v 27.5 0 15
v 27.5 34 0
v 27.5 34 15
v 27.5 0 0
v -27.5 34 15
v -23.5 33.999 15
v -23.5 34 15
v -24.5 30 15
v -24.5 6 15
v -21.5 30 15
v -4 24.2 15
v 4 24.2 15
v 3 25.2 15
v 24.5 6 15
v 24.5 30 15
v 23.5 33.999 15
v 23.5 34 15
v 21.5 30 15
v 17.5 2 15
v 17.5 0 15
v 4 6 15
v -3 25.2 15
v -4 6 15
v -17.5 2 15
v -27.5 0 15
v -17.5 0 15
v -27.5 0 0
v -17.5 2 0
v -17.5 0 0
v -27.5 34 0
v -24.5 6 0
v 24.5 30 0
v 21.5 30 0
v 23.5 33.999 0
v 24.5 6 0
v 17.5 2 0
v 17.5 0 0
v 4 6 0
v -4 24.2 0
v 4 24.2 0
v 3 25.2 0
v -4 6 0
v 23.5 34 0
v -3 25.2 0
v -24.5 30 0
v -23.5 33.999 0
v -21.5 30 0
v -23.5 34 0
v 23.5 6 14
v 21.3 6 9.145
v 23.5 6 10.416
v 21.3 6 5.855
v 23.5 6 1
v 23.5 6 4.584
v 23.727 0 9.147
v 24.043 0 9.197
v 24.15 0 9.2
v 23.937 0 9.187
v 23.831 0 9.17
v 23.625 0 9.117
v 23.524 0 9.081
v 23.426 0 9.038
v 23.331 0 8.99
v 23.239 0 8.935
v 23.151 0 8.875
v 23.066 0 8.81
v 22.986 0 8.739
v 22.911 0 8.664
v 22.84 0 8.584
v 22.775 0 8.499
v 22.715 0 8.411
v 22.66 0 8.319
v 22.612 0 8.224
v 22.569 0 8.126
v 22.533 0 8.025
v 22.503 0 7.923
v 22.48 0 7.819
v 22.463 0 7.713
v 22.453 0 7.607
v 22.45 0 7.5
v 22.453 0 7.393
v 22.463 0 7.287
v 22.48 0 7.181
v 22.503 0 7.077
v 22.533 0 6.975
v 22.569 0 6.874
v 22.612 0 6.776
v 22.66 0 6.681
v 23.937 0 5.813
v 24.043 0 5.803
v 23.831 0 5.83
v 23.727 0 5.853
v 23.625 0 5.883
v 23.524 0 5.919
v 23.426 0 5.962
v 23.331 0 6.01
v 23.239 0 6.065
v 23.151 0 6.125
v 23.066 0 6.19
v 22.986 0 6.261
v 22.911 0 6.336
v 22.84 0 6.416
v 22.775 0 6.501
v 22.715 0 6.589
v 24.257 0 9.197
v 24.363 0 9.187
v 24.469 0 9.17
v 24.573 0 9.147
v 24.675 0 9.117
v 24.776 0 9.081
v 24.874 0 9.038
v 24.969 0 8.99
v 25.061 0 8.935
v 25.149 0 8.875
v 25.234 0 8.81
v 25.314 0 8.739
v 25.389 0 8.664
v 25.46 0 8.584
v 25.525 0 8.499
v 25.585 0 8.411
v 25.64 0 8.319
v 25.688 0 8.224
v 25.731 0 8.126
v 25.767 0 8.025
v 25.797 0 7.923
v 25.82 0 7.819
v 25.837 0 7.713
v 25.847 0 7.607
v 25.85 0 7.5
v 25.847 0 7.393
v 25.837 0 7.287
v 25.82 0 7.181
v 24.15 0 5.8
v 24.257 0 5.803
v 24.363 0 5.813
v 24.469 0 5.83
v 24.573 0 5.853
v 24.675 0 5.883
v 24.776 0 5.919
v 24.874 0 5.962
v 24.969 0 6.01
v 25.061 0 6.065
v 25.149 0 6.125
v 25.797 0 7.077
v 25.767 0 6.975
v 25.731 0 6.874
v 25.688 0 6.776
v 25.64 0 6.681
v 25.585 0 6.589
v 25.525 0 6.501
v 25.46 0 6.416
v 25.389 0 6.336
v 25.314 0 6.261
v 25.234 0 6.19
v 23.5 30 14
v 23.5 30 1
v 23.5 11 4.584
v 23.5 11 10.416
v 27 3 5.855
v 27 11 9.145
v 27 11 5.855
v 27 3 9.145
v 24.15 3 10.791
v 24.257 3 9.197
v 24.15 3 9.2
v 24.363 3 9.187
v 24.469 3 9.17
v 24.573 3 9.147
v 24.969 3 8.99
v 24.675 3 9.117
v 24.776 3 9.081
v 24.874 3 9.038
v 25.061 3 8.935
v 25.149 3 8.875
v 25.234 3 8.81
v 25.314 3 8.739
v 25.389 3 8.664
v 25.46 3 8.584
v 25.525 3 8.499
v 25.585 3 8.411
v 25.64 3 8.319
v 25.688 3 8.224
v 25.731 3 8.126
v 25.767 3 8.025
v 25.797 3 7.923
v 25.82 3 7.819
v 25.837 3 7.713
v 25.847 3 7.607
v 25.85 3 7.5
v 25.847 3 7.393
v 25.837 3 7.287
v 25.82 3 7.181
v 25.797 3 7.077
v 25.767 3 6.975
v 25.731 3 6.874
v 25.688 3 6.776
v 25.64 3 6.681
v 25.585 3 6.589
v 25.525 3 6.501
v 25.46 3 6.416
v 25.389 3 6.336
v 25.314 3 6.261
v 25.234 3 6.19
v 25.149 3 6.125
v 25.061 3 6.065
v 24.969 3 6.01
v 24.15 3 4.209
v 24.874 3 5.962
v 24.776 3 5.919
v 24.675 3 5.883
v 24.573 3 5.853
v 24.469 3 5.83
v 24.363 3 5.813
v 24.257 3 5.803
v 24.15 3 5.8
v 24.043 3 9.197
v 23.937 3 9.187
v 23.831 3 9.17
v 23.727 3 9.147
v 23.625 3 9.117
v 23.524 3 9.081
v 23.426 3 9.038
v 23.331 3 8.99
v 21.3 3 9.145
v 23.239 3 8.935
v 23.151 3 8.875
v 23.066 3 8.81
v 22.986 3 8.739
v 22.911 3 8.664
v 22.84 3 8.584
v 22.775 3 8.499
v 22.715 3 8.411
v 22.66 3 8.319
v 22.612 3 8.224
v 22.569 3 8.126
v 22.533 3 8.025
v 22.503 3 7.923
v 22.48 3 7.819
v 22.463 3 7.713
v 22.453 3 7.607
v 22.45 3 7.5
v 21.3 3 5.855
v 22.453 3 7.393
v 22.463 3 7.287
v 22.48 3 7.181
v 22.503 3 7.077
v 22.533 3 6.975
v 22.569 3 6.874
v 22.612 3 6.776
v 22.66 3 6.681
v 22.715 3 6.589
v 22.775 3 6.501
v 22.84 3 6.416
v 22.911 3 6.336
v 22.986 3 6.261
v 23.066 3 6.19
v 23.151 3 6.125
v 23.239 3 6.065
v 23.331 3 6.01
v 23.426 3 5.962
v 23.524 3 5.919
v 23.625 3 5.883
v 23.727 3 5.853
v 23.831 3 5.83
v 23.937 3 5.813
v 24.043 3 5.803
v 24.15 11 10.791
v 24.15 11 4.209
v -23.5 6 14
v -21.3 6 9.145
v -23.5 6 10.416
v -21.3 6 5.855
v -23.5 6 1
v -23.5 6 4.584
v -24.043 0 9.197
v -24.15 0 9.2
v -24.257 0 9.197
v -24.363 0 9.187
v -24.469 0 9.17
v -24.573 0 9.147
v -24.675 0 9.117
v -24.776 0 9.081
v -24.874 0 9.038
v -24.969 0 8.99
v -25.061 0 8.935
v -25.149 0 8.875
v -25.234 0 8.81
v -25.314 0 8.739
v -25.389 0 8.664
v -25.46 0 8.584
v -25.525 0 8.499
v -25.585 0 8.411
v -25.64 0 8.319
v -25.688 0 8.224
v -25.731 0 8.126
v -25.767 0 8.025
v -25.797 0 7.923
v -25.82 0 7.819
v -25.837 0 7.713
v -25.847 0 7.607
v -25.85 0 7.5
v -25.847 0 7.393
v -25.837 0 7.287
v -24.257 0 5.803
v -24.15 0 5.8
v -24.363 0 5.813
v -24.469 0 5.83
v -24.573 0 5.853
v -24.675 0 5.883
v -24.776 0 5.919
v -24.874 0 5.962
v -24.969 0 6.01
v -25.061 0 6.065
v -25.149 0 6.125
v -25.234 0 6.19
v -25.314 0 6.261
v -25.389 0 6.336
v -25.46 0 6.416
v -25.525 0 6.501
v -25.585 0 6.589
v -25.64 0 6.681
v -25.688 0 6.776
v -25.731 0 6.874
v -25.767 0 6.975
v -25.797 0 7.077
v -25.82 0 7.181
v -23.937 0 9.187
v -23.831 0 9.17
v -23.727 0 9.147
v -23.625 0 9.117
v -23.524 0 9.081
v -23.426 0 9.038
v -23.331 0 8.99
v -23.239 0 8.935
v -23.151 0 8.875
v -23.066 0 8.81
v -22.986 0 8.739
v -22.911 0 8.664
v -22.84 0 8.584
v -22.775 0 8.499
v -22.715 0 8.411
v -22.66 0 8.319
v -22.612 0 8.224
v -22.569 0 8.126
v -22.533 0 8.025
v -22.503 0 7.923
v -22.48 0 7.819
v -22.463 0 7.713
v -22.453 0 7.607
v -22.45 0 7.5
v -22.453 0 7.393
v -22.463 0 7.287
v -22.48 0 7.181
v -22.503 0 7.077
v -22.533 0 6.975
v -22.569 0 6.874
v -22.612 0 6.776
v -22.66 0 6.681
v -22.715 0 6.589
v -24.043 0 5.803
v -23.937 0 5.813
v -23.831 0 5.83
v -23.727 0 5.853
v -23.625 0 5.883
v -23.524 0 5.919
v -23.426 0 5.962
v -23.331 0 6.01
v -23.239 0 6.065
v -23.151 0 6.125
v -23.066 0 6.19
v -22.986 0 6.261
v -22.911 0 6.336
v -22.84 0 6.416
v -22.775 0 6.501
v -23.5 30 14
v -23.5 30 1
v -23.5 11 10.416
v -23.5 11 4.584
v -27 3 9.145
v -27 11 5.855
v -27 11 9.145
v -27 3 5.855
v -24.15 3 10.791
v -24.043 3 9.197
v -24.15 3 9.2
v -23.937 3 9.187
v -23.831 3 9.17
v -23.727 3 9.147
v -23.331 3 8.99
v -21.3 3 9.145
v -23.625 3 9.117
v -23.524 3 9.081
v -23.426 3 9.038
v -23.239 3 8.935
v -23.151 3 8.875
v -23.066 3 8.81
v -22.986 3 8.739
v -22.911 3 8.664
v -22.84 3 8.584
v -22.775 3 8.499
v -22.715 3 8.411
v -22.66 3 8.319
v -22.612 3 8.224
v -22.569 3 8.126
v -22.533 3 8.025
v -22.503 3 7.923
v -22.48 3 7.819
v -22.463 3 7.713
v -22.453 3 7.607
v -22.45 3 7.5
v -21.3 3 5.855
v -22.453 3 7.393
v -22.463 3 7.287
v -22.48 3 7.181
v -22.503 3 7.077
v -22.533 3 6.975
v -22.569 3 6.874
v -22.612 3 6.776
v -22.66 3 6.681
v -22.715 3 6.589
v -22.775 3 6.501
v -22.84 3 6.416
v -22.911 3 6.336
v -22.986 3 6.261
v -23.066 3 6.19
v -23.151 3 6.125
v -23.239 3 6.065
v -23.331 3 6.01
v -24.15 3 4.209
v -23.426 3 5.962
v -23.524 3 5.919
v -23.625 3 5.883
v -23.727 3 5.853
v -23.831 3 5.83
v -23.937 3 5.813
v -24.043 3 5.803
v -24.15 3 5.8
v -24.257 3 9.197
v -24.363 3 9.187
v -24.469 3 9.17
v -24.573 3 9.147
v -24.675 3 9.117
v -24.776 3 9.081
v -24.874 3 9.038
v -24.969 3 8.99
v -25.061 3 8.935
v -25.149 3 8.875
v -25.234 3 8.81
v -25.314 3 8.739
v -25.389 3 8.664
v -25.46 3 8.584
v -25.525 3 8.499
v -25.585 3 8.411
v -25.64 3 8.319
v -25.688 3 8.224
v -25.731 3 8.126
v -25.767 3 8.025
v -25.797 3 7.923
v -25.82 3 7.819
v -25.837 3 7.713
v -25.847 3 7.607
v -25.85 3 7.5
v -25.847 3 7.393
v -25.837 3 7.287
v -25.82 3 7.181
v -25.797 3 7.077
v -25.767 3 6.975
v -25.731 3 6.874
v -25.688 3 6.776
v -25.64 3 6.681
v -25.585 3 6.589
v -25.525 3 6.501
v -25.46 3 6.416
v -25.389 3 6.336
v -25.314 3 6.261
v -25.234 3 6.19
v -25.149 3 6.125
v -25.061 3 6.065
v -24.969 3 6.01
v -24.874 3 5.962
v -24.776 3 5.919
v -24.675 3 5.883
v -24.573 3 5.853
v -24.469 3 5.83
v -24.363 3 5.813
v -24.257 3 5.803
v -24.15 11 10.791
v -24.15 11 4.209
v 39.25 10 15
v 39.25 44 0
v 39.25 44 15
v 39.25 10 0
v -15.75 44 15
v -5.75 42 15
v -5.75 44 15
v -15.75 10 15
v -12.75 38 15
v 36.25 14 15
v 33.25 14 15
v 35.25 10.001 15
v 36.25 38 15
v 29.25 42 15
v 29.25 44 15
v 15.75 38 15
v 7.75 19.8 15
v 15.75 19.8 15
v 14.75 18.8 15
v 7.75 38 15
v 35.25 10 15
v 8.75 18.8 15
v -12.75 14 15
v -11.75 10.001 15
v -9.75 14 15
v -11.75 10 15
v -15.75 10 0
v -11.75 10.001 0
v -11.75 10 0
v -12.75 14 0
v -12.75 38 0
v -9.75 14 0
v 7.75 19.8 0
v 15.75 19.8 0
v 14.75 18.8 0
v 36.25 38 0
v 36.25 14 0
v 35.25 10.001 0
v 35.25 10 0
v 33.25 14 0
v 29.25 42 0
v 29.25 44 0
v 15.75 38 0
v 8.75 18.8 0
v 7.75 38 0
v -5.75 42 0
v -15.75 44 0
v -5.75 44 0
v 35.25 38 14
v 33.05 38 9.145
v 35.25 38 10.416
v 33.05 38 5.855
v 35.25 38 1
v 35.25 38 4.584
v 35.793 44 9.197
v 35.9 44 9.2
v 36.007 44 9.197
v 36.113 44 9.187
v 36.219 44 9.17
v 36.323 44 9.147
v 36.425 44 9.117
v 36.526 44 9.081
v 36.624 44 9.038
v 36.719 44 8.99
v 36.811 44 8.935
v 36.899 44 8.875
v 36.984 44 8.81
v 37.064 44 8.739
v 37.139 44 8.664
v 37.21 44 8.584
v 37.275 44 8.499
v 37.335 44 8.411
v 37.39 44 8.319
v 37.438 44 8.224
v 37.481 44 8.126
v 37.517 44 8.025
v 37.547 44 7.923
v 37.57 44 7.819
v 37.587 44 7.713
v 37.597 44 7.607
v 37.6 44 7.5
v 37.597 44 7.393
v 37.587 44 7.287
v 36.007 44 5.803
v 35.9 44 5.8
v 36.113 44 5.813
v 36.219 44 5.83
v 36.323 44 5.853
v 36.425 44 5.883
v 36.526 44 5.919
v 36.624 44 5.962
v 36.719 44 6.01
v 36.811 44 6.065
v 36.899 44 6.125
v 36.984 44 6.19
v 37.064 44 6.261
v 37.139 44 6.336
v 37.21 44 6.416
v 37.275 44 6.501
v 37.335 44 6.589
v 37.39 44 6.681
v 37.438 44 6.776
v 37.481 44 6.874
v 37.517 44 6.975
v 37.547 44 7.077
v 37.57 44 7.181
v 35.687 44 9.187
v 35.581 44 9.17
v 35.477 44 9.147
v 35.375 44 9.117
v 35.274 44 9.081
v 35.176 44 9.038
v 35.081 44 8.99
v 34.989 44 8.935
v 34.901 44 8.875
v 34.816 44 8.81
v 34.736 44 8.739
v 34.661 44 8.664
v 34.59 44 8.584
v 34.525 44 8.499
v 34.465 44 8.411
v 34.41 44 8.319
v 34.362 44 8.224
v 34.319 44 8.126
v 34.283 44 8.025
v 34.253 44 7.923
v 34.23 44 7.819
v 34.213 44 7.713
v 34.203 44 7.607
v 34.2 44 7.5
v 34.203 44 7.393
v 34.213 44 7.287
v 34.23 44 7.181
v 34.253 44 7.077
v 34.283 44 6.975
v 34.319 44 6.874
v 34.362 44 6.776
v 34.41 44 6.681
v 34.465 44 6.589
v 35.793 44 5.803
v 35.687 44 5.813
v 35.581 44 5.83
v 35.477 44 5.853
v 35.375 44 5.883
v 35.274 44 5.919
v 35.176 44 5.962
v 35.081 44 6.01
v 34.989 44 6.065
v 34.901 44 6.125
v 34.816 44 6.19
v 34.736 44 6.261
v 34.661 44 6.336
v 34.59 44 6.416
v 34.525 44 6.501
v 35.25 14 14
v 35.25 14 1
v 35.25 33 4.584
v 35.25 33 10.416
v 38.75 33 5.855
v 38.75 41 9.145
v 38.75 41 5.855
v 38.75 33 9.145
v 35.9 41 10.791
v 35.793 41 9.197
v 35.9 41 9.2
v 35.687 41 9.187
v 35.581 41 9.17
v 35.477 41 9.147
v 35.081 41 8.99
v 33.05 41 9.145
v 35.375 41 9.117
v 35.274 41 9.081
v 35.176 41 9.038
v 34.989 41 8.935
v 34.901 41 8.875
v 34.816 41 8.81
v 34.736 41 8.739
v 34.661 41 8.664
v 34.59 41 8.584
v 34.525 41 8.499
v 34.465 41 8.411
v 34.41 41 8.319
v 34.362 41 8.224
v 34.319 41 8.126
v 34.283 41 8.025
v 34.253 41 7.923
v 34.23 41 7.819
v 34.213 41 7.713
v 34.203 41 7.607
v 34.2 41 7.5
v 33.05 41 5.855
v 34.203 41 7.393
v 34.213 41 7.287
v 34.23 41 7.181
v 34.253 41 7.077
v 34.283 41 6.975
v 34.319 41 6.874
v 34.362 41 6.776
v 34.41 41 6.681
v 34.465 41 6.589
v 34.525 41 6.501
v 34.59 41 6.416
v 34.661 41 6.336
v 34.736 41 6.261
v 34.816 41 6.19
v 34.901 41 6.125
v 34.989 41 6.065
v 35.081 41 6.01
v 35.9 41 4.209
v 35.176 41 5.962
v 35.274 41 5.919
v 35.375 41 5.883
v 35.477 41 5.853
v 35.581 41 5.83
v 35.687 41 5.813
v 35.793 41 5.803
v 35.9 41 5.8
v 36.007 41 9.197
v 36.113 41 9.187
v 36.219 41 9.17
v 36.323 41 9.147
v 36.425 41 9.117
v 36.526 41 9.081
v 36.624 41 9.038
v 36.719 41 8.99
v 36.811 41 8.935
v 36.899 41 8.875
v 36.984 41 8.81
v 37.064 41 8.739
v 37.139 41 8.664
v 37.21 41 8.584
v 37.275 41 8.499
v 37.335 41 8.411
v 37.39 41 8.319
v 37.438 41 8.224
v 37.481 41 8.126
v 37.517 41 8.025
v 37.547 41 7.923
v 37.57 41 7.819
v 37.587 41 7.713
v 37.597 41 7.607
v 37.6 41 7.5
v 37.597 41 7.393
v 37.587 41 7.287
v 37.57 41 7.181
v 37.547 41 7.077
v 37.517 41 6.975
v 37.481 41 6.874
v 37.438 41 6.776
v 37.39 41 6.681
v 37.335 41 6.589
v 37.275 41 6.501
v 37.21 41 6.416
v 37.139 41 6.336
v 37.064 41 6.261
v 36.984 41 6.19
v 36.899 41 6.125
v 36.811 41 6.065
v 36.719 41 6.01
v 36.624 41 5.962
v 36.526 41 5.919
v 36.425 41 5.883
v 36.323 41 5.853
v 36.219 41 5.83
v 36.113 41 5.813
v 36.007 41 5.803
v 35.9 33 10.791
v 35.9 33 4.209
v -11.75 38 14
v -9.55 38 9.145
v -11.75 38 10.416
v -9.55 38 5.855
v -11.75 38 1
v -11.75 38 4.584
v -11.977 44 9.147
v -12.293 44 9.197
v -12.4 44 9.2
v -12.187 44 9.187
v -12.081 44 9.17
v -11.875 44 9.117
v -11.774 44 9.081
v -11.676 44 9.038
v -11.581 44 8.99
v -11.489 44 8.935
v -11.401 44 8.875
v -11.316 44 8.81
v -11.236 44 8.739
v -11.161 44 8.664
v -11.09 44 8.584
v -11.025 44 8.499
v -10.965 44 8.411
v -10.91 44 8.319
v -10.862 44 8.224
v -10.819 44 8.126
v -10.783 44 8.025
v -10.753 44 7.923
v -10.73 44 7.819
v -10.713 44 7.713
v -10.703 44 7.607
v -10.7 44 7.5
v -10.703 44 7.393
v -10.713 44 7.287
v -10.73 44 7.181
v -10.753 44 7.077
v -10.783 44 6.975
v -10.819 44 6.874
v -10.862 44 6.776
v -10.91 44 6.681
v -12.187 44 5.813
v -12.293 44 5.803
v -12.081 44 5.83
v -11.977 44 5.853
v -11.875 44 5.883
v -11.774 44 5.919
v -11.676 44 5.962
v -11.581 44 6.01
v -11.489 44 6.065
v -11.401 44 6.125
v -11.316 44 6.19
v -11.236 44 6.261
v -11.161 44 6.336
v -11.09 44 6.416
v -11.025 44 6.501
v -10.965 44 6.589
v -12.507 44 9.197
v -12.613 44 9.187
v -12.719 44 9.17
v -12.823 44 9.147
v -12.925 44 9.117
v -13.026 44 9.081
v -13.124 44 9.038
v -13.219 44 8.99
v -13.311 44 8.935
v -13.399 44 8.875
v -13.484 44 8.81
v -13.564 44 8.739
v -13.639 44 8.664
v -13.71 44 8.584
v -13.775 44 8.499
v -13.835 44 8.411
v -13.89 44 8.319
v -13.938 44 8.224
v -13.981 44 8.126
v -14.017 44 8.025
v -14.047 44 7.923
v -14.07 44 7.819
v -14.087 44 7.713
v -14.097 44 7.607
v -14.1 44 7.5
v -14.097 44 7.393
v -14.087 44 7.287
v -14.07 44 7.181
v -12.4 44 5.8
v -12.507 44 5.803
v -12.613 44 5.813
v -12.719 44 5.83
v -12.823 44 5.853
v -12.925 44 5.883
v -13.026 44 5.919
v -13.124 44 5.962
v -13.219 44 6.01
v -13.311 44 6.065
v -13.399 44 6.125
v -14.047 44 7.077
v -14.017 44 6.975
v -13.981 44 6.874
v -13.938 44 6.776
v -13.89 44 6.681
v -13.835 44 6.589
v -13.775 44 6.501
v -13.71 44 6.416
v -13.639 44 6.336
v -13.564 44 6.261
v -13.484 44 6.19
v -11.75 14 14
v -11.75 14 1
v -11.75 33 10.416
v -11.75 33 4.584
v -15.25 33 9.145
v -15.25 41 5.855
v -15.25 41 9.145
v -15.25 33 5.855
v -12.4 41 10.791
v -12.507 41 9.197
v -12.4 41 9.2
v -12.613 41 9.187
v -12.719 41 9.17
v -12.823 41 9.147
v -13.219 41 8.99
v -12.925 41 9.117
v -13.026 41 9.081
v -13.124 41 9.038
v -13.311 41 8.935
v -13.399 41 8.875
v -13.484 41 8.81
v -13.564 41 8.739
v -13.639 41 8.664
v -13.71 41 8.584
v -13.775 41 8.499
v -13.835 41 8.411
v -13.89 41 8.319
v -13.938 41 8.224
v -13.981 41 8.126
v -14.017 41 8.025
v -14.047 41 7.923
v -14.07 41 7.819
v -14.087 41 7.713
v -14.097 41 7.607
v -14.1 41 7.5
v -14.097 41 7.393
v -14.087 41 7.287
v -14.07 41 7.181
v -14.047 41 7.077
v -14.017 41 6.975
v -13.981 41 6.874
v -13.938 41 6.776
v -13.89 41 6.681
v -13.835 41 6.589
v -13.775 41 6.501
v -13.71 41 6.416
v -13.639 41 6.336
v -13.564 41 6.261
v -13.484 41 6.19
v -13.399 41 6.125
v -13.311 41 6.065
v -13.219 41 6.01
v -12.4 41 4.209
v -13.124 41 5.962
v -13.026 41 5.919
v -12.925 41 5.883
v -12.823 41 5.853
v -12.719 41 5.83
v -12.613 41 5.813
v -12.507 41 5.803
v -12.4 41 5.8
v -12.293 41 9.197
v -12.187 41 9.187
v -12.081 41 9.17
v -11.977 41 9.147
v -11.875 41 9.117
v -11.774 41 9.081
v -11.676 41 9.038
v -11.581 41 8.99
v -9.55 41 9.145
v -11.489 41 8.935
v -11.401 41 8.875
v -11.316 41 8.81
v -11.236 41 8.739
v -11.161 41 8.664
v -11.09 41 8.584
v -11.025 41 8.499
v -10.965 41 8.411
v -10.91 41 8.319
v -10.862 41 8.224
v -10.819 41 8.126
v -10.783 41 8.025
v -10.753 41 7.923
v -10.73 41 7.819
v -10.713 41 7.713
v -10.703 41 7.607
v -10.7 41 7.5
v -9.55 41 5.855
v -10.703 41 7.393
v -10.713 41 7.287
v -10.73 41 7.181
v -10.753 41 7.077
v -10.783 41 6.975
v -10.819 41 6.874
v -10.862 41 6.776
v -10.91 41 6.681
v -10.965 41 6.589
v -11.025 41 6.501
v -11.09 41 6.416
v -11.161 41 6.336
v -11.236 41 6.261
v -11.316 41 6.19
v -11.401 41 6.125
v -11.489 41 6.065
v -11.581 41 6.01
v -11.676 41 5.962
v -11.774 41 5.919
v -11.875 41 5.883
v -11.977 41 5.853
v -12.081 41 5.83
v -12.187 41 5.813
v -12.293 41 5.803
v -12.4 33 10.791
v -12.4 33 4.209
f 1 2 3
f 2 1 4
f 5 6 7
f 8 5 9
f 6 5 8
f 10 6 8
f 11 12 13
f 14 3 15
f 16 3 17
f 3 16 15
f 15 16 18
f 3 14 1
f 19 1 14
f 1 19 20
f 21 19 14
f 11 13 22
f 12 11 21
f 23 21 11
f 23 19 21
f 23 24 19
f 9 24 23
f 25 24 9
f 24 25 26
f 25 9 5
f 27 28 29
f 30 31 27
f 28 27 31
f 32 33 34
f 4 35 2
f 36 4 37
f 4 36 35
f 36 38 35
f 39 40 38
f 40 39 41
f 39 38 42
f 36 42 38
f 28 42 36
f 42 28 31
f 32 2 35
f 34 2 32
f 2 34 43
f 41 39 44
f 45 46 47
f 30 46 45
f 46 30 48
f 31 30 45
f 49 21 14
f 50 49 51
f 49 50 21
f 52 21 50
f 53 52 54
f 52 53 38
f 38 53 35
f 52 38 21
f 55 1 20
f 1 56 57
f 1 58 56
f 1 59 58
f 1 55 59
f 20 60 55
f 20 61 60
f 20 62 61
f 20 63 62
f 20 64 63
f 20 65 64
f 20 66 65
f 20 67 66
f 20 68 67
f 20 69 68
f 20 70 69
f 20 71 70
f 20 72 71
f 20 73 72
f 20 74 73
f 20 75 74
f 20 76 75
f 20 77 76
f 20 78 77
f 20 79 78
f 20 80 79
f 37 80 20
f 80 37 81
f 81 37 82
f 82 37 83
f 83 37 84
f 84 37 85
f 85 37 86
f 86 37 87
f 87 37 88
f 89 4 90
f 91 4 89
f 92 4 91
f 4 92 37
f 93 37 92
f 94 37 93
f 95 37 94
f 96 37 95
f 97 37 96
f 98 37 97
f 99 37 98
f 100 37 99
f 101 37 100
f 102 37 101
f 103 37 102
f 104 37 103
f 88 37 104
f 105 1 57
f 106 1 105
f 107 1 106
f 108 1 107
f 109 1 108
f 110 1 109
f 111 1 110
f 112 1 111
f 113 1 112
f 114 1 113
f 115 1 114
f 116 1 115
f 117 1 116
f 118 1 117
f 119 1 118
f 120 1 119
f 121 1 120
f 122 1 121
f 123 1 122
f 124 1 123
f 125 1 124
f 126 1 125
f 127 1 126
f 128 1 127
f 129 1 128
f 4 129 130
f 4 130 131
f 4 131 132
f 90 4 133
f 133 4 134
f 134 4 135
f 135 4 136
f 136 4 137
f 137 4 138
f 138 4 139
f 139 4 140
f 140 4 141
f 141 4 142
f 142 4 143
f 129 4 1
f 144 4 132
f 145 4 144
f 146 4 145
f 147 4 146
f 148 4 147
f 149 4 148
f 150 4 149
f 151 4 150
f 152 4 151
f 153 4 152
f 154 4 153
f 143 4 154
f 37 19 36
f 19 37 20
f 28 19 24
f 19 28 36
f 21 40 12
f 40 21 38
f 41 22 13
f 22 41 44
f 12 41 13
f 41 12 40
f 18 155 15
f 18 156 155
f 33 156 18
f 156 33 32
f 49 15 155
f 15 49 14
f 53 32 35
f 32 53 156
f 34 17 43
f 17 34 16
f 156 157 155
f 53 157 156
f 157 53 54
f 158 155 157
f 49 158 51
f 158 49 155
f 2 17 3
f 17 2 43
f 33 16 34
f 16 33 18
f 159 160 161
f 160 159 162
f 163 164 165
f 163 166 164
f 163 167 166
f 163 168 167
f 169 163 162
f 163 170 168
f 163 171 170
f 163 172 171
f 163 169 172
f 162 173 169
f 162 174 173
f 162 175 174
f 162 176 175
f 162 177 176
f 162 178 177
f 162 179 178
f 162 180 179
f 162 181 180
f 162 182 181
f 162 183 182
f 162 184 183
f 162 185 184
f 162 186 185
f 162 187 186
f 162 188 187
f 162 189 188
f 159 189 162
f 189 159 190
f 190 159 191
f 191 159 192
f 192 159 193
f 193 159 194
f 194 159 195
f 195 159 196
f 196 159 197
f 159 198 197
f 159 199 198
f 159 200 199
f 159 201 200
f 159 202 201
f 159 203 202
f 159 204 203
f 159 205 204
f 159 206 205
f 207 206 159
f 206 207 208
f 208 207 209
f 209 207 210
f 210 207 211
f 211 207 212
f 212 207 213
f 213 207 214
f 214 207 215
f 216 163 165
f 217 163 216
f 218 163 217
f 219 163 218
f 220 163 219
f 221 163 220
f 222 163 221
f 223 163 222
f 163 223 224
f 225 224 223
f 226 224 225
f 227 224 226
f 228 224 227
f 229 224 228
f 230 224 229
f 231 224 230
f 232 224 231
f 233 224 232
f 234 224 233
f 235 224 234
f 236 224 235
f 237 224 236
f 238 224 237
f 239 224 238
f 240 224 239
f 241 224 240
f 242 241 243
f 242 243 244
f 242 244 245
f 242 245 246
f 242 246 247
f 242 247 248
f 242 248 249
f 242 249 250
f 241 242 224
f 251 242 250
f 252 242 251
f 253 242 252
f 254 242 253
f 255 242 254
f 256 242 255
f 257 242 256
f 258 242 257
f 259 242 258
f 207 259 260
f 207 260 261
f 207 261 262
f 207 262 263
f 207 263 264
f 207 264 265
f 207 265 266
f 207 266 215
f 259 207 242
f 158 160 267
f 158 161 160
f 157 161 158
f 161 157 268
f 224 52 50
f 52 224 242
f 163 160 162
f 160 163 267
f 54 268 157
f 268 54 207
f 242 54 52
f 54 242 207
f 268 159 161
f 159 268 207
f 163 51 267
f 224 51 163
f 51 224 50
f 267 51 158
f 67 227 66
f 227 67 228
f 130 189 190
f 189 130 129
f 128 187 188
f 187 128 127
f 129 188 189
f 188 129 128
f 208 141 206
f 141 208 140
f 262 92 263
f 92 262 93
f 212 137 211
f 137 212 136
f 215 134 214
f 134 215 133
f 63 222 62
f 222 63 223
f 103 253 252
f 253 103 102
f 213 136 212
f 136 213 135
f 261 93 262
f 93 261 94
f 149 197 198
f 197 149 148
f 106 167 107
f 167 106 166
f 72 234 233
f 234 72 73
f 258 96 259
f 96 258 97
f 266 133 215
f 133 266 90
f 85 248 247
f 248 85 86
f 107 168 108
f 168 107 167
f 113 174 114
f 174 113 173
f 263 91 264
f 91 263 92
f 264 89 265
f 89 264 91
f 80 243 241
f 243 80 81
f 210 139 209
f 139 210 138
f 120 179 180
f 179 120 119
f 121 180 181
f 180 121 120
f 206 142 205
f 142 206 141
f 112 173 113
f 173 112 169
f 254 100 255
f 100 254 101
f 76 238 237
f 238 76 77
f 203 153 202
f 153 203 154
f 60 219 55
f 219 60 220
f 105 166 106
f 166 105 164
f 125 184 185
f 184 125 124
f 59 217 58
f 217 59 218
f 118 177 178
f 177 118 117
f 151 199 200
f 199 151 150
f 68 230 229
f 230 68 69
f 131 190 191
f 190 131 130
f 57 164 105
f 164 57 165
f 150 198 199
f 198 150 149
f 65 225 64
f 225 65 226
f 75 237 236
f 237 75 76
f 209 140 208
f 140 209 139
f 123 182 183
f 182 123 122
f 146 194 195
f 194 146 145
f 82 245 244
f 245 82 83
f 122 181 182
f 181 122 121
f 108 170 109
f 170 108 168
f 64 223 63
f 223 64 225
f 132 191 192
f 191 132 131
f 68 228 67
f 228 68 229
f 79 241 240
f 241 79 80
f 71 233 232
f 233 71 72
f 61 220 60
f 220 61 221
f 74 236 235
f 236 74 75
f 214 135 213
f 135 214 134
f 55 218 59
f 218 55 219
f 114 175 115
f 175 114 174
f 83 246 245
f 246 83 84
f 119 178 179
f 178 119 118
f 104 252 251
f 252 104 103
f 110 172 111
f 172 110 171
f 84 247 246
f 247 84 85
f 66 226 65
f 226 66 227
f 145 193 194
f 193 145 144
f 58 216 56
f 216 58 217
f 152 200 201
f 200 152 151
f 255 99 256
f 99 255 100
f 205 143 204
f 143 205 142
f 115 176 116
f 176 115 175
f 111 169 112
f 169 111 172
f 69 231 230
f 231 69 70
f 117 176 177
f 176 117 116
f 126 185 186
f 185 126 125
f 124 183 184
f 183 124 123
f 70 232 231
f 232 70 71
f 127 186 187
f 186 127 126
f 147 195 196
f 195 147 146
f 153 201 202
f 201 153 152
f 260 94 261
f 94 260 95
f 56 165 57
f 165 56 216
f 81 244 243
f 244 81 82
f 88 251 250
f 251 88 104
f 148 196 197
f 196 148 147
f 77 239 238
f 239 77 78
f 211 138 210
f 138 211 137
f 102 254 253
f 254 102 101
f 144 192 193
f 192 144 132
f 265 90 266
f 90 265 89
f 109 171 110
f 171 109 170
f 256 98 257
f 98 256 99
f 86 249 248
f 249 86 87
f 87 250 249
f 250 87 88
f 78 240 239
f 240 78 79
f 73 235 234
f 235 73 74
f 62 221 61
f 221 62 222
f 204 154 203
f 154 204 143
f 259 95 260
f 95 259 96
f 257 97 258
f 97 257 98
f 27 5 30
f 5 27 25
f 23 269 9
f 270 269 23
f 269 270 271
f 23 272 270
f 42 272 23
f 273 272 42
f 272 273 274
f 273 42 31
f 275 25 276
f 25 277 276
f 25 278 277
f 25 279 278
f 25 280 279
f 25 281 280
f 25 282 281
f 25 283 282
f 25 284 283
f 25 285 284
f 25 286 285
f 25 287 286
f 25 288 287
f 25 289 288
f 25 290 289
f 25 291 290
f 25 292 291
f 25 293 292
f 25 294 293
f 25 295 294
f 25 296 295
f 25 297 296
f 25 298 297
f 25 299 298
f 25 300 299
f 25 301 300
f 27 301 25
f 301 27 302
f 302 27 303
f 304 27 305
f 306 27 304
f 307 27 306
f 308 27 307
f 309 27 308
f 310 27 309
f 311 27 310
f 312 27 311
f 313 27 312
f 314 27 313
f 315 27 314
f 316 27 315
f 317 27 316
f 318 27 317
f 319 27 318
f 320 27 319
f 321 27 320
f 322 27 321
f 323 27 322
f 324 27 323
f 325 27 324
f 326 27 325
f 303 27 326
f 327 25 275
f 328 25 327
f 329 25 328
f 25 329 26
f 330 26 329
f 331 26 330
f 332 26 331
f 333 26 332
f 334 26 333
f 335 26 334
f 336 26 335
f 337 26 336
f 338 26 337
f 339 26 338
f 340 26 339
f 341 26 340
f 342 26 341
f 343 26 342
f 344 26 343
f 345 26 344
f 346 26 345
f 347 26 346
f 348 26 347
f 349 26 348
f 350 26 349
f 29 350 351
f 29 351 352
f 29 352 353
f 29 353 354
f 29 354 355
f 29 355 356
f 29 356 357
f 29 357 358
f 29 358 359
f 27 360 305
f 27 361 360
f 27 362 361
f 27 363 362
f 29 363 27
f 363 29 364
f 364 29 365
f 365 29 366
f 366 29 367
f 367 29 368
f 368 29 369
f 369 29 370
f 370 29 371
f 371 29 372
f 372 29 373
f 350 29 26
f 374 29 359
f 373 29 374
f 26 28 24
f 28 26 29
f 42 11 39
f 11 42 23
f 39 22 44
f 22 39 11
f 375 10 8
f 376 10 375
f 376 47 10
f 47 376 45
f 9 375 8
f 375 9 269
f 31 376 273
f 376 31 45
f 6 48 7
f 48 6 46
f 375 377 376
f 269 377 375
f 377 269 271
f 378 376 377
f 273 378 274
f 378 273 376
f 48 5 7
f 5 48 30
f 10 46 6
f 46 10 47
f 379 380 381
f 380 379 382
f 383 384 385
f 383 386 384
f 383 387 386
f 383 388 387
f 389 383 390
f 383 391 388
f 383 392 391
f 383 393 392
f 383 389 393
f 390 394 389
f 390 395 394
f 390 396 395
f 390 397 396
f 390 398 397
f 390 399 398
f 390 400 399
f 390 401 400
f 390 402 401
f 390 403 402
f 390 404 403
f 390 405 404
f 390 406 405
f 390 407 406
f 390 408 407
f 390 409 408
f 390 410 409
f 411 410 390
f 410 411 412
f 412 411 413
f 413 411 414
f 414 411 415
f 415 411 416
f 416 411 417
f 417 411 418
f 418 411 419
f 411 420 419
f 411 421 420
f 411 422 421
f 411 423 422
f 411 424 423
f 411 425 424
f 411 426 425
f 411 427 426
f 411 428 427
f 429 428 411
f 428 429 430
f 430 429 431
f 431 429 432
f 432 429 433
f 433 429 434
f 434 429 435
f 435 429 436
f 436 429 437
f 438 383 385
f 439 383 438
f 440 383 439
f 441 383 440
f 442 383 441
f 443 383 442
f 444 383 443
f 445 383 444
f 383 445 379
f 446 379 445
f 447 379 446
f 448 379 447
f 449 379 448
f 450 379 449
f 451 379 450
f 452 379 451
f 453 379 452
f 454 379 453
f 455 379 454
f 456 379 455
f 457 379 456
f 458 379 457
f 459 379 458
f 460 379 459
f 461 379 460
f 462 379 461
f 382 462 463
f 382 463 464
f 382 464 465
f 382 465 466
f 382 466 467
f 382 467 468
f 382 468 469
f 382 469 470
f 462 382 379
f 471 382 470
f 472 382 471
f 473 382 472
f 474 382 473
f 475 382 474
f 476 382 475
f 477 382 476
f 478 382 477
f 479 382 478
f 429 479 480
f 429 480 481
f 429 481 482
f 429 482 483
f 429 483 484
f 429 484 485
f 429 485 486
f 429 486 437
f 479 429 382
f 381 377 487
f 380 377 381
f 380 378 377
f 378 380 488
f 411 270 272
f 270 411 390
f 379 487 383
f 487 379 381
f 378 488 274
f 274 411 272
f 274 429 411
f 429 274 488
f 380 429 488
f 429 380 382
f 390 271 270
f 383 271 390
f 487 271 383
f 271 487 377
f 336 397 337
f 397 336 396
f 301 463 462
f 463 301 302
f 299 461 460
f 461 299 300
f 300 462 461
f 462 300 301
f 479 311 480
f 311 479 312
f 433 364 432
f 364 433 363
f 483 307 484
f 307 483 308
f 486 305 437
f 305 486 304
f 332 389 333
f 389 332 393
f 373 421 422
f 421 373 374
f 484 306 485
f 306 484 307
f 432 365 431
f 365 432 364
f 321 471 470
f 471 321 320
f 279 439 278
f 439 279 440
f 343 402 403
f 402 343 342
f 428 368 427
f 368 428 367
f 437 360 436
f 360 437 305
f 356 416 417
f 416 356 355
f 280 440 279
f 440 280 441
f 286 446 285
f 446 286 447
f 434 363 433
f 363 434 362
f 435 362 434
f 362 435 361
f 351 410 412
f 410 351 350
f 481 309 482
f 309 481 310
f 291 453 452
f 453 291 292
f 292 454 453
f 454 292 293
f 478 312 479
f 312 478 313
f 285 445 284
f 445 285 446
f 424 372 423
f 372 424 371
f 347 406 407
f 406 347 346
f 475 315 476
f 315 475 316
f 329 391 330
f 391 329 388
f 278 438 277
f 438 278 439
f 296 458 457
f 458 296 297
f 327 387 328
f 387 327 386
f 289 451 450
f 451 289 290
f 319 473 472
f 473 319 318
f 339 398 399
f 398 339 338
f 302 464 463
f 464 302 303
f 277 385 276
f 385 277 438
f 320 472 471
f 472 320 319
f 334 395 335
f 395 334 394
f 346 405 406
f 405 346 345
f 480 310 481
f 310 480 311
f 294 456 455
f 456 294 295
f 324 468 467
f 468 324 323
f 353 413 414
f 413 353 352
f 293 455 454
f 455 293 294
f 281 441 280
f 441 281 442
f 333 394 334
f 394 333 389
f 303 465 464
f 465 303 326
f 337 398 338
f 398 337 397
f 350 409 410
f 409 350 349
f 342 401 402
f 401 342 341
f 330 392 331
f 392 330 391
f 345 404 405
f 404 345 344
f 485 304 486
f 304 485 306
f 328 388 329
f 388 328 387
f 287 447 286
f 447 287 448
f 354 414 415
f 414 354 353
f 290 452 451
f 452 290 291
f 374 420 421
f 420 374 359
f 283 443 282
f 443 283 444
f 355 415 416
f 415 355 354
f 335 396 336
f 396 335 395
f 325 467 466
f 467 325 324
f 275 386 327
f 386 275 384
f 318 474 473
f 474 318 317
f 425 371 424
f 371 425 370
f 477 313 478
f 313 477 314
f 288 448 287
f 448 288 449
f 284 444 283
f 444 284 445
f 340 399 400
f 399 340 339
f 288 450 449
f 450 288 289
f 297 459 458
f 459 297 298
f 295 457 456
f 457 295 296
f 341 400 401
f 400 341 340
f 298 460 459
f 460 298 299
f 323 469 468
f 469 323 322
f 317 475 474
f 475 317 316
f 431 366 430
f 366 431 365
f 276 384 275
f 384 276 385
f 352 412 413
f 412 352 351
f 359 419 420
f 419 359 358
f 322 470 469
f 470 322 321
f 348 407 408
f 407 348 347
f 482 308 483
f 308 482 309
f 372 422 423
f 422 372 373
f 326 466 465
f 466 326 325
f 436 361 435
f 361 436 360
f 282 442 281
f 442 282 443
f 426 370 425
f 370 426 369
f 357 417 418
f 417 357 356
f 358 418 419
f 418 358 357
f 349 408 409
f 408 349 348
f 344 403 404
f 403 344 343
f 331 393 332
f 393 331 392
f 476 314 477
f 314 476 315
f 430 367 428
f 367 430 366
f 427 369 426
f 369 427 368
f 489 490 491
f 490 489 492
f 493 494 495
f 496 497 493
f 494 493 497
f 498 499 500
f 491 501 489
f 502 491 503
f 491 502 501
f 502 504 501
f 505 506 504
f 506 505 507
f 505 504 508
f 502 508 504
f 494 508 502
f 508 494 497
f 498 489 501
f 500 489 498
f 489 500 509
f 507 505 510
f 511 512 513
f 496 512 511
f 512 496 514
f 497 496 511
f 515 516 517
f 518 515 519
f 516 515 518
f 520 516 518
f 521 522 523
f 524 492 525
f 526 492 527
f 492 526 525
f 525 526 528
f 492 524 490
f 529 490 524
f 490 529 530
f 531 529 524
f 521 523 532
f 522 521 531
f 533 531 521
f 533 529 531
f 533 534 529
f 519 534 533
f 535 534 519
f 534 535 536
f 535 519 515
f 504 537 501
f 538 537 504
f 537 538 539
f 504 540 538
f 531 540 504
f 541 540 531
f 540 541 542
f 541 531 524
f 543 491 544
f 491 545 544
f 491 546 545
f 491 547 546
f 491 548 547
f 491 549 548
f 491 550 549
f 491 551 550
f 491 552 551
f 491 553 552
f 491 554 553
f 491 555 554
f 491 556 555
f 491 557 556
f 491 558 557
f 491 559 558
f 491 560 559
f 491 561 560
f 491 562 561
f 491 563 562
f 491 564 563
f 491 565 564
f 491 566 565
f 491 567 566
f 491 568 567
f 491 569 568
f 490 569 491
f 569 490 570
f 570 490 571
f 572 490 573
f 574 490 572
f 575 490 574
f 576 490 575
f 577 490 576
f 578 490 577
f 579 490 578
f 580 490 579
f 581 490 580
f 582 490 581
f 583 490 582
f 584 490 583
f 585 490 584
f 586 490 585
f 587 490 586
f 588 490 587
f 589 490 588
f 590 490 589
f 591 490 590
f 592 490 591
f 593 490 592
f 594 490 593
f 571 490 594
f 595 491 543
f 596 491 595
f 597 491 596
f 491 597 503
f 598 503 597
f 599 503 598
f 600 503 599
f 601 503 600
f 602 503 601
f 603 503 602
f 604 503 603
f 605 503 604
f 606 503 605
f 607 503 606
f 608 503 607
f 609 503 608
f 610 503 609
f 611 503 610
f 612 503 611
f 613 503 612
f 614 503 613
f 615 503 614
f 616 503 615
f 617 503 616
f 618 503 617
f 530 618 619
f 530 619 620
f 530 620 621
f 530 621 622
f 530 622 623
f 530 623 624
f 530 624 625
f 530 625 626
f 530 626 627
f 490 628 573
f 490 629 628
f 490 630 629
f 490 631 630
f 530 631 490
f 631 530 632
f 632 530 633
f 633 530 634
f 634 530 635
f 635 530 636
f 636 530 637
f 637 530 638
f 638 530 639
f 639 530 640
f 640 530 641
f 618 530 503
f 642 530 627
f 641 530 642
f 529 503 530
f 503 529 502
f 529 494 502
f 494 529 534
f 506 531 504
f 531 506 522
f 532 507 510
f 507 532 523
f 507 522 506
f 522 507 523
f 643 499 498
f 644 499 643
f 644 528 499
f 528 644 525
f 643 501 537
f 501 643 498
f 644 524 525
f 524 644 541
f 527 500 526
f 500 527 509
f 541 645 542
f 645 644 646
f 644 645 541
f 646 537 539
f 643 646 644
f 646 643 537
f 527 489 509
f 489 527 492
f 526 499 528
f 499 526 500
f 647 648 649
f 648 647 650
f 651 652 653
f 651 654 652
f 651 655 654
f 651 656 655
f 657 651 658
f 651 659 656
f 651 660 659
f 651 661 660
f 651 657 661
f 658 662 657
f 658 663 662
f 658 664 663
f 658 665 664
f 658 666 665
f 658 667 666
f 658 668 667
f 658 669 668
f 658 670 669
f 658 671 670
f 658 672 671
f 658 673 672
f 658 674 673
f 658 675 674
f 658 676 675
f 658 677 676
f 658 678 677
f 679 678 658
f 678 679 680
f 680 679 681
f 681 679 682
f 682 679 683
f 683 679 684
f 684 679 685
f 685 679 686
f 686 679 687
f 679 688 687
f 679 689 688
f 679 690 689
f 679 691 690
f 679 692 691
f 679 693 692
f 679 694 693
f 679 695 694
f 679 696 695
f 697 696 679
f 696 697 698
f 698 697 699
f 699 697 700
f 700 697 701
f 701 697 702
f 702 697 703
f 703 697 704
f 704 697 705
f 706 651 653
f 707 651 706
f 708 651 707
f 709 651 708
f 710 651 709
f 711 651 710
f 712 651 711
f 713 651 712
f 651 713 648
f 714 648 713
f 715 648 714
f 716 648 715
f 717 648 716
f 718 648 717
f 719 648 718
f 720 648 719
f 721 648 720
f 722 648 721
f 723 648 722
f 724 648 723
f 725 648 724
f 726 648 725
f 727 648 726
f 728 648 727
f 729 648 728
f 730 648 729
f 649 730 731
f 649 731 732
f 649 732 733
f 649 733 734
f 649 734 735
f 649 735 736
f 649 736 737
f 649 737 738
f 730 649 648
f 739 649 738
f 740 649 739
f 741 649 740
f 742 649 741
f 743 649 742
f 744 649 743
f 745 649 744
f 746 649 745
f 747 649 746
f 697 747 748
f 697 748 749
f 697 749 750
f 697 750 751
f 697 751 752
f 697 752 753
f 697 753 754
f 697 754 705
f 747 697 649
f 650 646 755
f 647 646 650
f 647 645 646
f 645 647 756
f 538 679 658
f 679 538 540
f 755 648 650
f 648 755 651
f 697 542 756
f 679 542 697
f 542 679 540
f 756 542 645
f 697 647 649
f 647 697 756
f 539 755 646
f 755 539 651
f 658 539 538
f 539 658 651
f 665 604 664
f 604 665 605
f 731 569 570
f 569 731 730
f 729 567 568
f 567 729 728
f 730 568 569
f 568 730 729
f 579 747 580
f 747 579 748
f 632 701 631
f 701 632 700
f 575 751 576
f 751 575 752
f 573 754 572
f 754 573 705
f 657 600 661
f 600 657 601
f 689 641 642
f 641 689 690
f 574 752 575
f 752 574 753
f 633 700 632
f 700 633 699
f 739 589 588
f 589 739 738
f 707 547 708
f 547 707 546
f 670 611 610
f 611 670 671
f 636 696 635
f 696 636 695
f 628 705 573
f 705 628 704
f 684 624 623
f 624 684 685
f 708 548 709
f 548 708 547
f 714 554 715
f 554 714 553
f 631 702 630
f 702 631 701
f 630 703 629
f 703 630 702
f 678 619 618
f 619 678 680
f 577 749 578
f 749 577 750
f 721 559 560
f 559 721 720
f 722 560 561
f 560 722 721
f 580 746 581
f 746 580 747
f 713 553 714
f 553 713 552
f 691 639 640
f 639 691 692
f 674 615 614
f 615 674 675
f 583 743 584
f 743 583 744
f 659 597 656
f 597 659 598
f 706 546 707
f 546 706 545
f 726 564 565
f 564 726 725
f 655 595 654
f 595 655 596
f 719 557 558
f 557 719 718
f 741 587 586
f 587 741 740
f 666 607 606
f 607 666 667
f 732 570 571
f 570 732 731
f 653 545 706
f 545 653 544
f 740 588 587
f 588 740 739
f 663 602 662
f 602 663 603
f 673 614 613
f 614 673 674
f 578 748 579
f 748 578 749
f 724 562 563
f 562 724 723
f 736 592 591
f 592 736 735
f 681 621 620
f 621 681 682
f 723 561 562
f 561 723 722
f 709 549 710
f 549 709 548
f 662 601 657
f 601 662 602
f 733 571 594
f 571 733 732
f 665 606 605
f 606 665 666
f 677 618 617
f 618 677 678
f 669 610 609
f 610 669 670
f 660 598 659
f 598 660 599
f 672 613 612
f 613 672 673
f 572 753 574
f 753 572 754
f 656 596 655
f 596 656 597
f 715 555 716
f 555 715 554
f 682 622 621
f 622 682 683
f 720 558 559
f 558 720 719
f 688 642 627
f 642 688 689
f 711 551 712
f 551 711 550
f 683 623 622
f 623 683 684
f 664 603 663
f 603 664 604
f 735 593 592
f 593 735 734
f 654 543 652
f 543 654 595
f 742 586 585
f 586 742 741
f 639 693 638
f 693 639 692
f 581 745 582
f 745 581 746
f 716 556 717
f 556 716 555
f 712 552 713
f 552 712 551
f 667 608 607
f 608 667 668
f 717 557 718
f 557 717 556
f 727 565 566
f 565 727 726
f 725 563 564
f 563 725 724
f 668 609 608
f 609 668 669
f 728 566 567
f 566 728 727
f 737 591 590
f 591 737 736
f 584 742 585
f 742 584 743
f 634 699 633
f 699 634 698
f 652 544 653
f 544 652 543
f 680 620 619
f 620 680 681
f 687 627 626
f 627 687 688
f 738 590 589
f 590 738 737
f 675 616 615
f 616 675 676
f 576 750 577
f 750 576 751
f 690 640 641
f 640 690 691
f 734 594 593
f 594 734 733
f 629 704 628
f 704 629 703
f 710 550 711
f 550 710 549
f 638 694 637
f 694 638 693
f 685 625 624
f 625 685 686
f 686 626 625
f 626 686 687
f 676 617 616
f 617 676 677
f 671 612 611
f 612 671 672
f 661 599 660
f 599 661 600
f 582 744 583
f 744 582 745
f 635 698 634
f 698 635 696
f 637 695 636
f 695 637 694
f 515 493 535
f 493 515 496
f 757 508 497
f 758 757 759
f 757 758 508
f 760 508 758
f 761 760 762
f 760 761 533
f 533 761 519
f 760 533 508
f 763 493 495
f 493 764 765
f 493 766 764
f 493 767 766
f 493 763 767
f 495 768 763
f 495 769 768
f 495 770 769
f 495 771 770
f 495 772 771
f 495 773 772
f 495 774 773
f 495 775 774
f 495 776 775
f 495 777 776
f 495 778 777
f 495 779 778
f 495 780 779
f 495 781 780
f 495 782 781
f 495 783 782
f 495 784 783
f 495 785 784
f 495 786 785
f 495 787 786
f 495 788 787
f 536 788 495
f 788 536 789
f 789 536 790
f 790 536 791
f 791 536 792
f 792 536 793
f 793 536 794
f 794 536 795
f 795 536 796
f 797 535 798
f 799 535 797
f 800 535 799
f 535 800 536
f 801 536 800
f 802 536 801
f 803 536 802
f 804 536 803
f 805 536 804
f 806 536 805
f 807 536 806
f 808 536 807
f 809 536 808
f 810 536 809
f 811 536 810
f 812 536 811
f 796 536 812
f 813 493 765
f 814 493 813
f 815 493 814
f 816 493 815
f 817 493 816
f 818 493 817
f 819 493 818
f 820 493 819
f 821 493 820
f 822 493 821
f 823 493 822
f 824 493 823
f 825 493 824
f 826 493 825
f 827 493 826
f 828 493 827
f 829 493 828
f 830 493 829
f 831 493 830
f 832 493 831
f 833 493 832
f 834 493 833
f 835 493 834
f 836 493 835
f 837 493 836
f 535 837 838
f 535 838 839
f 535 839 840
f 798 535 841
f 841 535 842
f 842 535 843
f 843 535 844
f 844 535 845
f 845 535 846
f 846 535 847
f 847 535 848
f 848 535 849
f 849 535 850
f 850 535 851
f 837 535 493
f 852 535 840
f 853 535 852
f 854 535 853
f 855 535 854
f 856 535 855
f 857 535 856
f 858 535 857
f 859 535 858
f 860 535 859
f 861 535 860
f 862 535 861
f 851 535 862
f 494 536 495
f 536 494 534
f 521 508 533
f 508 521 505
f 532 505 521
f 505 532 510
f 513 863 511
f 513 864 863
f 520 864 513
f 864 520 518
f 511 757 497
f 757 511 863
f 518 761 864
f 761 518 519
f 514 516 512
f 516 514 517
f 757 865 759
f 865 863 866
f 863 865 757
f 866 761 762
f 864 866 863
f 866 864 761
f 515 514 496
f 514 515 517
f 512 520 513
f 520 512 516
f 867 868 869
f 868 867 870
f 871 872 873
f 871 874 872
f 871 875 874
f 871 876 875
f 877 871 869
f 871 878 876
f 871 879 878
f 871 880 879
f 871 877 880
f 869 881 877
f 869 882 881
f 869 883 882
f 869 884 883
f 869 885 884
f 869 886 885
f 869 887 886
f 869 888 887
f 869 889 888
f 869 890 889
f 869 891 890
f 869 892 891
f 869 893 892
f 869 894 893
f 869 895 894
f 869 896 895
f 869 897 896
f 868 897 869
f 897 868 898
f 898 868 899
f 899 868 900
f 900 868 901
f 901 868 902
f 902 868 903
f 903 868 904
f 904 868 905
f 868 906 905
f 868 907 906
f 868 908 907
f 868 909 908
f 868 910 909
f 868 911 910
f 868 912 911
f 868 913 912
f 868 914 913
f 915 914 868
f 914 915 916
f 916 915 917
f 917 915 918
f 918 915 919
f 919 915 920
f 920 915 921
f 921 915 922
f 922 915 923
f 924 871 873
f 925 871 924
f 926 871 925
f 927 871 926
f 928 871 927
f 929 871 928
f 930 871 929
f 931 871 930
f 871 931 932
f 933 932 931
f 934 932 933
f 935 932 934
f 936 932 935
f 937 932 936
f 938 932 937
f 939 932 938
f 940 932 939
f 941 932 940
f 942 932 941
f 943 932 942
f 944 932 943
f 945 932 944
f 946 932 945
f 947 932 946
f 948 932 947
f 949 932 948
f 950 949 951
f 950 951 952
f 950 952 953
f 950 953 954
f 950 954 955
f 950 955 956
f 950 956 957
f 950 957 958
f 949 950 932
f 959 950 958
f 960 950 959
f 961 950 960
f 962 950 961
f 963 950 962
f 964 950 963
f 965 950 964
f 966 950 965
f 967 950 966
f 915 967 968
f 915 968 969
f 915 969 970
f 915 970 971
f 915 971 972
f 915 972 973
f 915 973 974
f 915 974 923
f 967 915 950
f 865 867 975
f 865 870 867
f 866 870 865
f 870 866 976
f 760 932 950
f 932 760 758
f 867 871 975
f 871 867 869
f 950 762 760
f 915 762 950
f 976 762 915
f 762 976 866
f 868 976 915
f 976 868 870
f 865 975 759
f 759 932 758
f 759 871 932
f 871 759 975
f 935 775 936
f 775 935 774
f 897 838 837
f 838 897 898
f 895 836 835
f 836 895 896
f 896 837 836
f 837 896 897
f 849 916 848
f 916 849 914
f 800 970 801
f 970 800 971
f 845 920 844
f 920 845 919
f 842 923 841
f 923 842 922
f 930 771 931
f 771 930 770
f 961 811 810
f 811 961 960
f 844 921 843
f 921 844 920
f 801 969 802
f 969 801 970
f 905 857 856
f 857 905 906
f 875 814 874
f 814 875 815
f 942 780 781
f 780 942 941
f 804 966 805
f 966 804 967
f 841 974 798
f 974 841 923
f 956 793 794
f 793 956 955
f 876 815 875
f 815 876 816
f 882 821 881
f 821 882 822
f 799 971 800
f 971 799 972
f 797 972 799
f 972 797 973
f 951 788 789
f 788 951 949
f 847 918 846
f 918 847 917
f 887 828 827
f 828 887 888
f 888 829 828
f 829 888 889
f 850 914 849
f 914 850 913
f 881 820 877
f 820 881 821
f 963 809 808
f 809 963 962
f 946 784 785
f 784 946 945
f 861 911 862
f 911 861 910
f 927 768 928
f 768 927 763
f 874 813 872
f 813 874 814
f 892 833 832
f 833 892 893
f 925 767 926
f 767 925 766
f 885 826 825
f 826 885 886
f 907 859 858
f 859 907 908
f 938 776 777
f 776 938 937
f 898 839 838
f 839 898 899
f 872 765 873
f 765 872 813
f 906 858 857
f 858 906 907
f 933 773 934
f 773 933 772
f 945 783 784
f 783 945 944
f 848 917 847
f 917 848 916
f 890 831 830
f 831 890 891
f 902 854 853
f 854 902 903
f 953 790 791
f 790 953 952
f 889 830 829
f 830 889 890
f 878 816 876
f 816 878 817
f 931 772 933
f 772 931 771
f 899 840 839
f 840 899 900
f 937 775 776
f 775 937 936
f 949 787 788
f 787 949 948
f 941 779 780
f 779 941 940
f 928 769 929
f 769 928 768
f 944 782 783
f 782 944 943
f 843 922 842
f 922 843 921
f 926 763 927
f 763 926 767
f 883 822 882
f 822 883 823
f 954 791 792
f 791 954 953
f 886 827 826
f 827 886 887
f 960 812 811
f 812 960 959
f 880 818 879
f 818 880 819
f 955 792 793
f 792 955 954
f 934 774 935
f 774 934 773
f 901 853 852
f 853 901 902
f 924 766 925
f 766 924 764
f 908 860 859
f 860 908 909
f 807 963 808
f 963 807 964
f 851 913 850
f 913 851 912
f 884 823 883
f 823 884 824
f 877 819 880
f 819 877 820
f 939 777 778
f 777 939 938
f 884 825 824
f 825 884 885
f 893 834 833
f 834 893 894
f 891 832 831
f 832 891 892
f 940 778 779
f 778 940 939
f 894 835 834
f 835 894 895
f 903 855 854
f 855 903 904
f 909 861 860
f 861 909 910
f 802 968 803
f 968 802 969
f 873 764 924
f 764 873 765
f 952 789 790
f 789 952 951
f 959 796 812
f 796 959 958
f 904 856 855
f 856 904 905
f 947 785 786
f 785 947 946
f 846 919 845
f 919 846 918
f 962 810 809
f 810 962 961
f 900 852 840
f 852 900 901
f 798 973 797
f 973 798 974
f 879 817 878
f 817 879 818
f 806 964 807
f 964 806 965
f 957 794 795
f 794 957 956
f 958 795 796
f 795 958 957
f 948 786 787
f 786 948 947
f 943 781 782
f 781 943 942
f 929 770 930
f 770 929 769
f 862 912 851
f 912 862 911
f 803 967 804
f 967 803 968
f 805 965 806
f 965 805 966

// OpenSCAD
// Created from Code_Clip_RAMPS.stl
// https://github.com/Mecan0/Code
// By J.Rodigo (www.jra.so)
// Licence Creative commons atribution & share alike.

/**************************/
// Parámetros de la pieza  /
/**************************/

// Características del soporte 
hCen = 19.2;	// Altura del soporte central (19.2)
hClip = 4.8;	// Altura del clip respecto al soporte central (4.8)
wClip = 47;		// Anchura de clip a clip (interior)(47)

//Características del tornillo
dTor = 3.4;		// Diámetro de la rosca (3.4)
hHex = 5.7;		// Altura entre caras planas de la tuerca (5.7)

/**************************/
// Partes para media pieza /
/**************************/

// Bloque de la base del soporte
module base(){
	difference(){
		// Bloque
		cube([wClip/2+4, 6, 15]);
		// Vaciado inferior 
		translate([-1, -1, -1])
		cube([wClip/2-5, 3, 17]);
	}
}

// Bloque central del soporte
module centro(){
	difference(){
		// Bloque central
		translate([0, 5, 0])
		cube([4, hCen+1, 15]);
		// Chaflán a lo largo del eje Z
		translate([3, hCen+6, -1])
		rotate( -45 ,[0, 0, 1])
		cube([2, 1, 17]);
	}
}
// hCen+hClip
// Bloque del clip lateral
module clip(){
	difference(){
		// Cubo del clip a lo largo del eje Y
		translate([wClip/2, 0, 0])
		cube([4, hCen+hClip+10, 15]);
		// Chaflanes
		union(){
			// Chaflán superior
			translate([wClip/2, hCen+hClip+6, 14])
			rotate( 90 ,[1, 0, 0])
			rotate( 45 ,[0, 0, 1])
			cube([2, 1, hCen+hClip]);
			// Chaflán inferior 
			translate([wClip/2+1, hCen+hClip+6, 0])
			rotate( 90 ,[1, 0, 0])
			rotate( 135 ,[0, 0, 1])
			cube([2, 1, hCen+hClip]);
		}
	}
	// Extremo (duro) del clip
	difference(){
		translate([wClip/2-2, hCen+hClip+6, 0])
		cube([6, 4, 15]);
		// Chaflán 
		translate([wClip/2-2, hCen+hClip+6, -1])
		rotate( 63.43 ,[0, 0, 1])
		cube([5, 2, 17]);
	}
}

// Generar un hexágono circunscrito (Diametro,altura) 
module hexagono(d,h){ 
	for (a = [0, 60,120]){ 
		rotate( a, [0, 0, 1])
		cube([d, d*tan(30), h], center = true);
	}
}

// Alojamiento para el tornillo
module tornillo(){
	translate([wClip/2+0.65, 7, 7.5])
	rotate( 90, [1, 0, 0])
	union() {
		hexagono(hHex, 8);
		cylinder(h = 8, r = dTor/2, $fn=100);
	}
}

// Unimos tordas las partes para crear la media Pieza
module mpieza(){
	difference(){
		union(){
			// Bloque de la base del soporte
			base();
			// Bloque central del soporte
			centro();
			// Bloque del clip lateral
			clip();
		}
		// Alojamiento para el tornillo
		tornillo();
	}
}

// Unimos las dos mitades para crear la pieza entera
module pieza(){
	mpieza();
	mirror([ 1, 0, 0 ])
	mpieza();
}

/**************************/
//  Generamos las piezas   /
/**************************/

// Generamos la pieza
	
	pieza();

// Generamos otra pieza desplazada y simétrica

	translate([wClip/4, hCen+hClip+20, 0])
	mirror([ 0, 1, 0 ])
	pieza();
